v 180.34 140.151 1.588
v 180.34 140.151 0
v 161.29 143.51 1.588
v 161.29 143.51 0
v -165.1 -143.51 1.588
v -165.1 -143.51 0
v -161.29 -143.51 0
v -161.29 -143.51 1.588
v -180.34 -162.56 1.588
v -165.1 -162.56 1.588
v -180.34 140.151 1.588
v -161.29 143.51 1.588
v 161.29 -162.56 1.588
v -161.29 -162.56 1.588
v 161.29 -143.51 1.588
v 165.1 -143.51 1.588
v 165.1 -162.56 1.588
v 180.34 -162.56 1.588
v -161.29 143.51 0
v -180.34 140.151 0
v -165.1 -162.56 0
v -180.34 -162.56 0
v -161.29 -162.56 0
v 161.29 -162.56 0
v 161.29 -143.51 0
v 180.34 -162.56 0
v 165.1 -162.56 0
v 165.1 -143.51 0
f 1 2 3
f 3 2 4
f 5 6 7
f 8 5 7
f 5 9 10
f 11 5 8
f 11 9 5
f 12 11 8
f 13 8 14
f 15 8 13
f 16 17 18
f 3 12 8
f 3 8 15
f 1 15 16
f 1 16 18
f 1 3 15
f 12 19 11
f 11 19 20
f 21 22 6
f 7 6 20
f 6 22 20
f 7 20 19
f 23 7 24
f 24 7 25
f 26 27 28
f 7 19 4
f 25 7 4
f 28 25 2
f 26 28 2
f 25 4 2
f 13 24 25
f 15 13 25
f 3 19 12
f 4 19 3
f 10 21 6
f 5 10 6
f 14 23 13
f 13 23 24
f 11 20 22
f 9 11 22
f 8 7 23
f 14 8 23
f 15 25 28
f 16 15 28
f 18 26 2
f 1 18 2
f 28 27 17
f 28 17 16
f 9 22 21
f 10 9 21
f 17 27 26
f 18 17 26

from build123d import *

# Parameters (mm, degrees)
F0_W     = 322.58
F0_H     = 287.02
F0_H_2   = 19.05
F0_W_2   = 15.24
F1_DEPTH = 1.5875


with BuildPart() as f1:
    # F0 (on Top) → F1 (new body)
    with BuildSketch(Plane.XY):
        Rectangle(F0_W, F0_H)
        with Locations((0, -153.035)):
            Rectangle(F0_W, F0_H_2)
        Polygon((-161.29, -143.51), (-161.29, 143.51), (-180.34, 140.150971), (-180.34, -143.51), (-165.1, -143.51), align=None)
        with Locations((-172.72, -153.035)):
            Rectangle(F0_W_2, F0_H_2)
        with Locations((172.72, -153.035)):
            Rectangle(F0_W_2, F0_H_2)
        Polygon((180.34, 140.150971), (161.29, 143.51), (161.29, -143.51), (165.1, -143.51), (180.34, -143.51), align=None)
    extrude(amount=F1_DEPTH)


solid = f1.part
